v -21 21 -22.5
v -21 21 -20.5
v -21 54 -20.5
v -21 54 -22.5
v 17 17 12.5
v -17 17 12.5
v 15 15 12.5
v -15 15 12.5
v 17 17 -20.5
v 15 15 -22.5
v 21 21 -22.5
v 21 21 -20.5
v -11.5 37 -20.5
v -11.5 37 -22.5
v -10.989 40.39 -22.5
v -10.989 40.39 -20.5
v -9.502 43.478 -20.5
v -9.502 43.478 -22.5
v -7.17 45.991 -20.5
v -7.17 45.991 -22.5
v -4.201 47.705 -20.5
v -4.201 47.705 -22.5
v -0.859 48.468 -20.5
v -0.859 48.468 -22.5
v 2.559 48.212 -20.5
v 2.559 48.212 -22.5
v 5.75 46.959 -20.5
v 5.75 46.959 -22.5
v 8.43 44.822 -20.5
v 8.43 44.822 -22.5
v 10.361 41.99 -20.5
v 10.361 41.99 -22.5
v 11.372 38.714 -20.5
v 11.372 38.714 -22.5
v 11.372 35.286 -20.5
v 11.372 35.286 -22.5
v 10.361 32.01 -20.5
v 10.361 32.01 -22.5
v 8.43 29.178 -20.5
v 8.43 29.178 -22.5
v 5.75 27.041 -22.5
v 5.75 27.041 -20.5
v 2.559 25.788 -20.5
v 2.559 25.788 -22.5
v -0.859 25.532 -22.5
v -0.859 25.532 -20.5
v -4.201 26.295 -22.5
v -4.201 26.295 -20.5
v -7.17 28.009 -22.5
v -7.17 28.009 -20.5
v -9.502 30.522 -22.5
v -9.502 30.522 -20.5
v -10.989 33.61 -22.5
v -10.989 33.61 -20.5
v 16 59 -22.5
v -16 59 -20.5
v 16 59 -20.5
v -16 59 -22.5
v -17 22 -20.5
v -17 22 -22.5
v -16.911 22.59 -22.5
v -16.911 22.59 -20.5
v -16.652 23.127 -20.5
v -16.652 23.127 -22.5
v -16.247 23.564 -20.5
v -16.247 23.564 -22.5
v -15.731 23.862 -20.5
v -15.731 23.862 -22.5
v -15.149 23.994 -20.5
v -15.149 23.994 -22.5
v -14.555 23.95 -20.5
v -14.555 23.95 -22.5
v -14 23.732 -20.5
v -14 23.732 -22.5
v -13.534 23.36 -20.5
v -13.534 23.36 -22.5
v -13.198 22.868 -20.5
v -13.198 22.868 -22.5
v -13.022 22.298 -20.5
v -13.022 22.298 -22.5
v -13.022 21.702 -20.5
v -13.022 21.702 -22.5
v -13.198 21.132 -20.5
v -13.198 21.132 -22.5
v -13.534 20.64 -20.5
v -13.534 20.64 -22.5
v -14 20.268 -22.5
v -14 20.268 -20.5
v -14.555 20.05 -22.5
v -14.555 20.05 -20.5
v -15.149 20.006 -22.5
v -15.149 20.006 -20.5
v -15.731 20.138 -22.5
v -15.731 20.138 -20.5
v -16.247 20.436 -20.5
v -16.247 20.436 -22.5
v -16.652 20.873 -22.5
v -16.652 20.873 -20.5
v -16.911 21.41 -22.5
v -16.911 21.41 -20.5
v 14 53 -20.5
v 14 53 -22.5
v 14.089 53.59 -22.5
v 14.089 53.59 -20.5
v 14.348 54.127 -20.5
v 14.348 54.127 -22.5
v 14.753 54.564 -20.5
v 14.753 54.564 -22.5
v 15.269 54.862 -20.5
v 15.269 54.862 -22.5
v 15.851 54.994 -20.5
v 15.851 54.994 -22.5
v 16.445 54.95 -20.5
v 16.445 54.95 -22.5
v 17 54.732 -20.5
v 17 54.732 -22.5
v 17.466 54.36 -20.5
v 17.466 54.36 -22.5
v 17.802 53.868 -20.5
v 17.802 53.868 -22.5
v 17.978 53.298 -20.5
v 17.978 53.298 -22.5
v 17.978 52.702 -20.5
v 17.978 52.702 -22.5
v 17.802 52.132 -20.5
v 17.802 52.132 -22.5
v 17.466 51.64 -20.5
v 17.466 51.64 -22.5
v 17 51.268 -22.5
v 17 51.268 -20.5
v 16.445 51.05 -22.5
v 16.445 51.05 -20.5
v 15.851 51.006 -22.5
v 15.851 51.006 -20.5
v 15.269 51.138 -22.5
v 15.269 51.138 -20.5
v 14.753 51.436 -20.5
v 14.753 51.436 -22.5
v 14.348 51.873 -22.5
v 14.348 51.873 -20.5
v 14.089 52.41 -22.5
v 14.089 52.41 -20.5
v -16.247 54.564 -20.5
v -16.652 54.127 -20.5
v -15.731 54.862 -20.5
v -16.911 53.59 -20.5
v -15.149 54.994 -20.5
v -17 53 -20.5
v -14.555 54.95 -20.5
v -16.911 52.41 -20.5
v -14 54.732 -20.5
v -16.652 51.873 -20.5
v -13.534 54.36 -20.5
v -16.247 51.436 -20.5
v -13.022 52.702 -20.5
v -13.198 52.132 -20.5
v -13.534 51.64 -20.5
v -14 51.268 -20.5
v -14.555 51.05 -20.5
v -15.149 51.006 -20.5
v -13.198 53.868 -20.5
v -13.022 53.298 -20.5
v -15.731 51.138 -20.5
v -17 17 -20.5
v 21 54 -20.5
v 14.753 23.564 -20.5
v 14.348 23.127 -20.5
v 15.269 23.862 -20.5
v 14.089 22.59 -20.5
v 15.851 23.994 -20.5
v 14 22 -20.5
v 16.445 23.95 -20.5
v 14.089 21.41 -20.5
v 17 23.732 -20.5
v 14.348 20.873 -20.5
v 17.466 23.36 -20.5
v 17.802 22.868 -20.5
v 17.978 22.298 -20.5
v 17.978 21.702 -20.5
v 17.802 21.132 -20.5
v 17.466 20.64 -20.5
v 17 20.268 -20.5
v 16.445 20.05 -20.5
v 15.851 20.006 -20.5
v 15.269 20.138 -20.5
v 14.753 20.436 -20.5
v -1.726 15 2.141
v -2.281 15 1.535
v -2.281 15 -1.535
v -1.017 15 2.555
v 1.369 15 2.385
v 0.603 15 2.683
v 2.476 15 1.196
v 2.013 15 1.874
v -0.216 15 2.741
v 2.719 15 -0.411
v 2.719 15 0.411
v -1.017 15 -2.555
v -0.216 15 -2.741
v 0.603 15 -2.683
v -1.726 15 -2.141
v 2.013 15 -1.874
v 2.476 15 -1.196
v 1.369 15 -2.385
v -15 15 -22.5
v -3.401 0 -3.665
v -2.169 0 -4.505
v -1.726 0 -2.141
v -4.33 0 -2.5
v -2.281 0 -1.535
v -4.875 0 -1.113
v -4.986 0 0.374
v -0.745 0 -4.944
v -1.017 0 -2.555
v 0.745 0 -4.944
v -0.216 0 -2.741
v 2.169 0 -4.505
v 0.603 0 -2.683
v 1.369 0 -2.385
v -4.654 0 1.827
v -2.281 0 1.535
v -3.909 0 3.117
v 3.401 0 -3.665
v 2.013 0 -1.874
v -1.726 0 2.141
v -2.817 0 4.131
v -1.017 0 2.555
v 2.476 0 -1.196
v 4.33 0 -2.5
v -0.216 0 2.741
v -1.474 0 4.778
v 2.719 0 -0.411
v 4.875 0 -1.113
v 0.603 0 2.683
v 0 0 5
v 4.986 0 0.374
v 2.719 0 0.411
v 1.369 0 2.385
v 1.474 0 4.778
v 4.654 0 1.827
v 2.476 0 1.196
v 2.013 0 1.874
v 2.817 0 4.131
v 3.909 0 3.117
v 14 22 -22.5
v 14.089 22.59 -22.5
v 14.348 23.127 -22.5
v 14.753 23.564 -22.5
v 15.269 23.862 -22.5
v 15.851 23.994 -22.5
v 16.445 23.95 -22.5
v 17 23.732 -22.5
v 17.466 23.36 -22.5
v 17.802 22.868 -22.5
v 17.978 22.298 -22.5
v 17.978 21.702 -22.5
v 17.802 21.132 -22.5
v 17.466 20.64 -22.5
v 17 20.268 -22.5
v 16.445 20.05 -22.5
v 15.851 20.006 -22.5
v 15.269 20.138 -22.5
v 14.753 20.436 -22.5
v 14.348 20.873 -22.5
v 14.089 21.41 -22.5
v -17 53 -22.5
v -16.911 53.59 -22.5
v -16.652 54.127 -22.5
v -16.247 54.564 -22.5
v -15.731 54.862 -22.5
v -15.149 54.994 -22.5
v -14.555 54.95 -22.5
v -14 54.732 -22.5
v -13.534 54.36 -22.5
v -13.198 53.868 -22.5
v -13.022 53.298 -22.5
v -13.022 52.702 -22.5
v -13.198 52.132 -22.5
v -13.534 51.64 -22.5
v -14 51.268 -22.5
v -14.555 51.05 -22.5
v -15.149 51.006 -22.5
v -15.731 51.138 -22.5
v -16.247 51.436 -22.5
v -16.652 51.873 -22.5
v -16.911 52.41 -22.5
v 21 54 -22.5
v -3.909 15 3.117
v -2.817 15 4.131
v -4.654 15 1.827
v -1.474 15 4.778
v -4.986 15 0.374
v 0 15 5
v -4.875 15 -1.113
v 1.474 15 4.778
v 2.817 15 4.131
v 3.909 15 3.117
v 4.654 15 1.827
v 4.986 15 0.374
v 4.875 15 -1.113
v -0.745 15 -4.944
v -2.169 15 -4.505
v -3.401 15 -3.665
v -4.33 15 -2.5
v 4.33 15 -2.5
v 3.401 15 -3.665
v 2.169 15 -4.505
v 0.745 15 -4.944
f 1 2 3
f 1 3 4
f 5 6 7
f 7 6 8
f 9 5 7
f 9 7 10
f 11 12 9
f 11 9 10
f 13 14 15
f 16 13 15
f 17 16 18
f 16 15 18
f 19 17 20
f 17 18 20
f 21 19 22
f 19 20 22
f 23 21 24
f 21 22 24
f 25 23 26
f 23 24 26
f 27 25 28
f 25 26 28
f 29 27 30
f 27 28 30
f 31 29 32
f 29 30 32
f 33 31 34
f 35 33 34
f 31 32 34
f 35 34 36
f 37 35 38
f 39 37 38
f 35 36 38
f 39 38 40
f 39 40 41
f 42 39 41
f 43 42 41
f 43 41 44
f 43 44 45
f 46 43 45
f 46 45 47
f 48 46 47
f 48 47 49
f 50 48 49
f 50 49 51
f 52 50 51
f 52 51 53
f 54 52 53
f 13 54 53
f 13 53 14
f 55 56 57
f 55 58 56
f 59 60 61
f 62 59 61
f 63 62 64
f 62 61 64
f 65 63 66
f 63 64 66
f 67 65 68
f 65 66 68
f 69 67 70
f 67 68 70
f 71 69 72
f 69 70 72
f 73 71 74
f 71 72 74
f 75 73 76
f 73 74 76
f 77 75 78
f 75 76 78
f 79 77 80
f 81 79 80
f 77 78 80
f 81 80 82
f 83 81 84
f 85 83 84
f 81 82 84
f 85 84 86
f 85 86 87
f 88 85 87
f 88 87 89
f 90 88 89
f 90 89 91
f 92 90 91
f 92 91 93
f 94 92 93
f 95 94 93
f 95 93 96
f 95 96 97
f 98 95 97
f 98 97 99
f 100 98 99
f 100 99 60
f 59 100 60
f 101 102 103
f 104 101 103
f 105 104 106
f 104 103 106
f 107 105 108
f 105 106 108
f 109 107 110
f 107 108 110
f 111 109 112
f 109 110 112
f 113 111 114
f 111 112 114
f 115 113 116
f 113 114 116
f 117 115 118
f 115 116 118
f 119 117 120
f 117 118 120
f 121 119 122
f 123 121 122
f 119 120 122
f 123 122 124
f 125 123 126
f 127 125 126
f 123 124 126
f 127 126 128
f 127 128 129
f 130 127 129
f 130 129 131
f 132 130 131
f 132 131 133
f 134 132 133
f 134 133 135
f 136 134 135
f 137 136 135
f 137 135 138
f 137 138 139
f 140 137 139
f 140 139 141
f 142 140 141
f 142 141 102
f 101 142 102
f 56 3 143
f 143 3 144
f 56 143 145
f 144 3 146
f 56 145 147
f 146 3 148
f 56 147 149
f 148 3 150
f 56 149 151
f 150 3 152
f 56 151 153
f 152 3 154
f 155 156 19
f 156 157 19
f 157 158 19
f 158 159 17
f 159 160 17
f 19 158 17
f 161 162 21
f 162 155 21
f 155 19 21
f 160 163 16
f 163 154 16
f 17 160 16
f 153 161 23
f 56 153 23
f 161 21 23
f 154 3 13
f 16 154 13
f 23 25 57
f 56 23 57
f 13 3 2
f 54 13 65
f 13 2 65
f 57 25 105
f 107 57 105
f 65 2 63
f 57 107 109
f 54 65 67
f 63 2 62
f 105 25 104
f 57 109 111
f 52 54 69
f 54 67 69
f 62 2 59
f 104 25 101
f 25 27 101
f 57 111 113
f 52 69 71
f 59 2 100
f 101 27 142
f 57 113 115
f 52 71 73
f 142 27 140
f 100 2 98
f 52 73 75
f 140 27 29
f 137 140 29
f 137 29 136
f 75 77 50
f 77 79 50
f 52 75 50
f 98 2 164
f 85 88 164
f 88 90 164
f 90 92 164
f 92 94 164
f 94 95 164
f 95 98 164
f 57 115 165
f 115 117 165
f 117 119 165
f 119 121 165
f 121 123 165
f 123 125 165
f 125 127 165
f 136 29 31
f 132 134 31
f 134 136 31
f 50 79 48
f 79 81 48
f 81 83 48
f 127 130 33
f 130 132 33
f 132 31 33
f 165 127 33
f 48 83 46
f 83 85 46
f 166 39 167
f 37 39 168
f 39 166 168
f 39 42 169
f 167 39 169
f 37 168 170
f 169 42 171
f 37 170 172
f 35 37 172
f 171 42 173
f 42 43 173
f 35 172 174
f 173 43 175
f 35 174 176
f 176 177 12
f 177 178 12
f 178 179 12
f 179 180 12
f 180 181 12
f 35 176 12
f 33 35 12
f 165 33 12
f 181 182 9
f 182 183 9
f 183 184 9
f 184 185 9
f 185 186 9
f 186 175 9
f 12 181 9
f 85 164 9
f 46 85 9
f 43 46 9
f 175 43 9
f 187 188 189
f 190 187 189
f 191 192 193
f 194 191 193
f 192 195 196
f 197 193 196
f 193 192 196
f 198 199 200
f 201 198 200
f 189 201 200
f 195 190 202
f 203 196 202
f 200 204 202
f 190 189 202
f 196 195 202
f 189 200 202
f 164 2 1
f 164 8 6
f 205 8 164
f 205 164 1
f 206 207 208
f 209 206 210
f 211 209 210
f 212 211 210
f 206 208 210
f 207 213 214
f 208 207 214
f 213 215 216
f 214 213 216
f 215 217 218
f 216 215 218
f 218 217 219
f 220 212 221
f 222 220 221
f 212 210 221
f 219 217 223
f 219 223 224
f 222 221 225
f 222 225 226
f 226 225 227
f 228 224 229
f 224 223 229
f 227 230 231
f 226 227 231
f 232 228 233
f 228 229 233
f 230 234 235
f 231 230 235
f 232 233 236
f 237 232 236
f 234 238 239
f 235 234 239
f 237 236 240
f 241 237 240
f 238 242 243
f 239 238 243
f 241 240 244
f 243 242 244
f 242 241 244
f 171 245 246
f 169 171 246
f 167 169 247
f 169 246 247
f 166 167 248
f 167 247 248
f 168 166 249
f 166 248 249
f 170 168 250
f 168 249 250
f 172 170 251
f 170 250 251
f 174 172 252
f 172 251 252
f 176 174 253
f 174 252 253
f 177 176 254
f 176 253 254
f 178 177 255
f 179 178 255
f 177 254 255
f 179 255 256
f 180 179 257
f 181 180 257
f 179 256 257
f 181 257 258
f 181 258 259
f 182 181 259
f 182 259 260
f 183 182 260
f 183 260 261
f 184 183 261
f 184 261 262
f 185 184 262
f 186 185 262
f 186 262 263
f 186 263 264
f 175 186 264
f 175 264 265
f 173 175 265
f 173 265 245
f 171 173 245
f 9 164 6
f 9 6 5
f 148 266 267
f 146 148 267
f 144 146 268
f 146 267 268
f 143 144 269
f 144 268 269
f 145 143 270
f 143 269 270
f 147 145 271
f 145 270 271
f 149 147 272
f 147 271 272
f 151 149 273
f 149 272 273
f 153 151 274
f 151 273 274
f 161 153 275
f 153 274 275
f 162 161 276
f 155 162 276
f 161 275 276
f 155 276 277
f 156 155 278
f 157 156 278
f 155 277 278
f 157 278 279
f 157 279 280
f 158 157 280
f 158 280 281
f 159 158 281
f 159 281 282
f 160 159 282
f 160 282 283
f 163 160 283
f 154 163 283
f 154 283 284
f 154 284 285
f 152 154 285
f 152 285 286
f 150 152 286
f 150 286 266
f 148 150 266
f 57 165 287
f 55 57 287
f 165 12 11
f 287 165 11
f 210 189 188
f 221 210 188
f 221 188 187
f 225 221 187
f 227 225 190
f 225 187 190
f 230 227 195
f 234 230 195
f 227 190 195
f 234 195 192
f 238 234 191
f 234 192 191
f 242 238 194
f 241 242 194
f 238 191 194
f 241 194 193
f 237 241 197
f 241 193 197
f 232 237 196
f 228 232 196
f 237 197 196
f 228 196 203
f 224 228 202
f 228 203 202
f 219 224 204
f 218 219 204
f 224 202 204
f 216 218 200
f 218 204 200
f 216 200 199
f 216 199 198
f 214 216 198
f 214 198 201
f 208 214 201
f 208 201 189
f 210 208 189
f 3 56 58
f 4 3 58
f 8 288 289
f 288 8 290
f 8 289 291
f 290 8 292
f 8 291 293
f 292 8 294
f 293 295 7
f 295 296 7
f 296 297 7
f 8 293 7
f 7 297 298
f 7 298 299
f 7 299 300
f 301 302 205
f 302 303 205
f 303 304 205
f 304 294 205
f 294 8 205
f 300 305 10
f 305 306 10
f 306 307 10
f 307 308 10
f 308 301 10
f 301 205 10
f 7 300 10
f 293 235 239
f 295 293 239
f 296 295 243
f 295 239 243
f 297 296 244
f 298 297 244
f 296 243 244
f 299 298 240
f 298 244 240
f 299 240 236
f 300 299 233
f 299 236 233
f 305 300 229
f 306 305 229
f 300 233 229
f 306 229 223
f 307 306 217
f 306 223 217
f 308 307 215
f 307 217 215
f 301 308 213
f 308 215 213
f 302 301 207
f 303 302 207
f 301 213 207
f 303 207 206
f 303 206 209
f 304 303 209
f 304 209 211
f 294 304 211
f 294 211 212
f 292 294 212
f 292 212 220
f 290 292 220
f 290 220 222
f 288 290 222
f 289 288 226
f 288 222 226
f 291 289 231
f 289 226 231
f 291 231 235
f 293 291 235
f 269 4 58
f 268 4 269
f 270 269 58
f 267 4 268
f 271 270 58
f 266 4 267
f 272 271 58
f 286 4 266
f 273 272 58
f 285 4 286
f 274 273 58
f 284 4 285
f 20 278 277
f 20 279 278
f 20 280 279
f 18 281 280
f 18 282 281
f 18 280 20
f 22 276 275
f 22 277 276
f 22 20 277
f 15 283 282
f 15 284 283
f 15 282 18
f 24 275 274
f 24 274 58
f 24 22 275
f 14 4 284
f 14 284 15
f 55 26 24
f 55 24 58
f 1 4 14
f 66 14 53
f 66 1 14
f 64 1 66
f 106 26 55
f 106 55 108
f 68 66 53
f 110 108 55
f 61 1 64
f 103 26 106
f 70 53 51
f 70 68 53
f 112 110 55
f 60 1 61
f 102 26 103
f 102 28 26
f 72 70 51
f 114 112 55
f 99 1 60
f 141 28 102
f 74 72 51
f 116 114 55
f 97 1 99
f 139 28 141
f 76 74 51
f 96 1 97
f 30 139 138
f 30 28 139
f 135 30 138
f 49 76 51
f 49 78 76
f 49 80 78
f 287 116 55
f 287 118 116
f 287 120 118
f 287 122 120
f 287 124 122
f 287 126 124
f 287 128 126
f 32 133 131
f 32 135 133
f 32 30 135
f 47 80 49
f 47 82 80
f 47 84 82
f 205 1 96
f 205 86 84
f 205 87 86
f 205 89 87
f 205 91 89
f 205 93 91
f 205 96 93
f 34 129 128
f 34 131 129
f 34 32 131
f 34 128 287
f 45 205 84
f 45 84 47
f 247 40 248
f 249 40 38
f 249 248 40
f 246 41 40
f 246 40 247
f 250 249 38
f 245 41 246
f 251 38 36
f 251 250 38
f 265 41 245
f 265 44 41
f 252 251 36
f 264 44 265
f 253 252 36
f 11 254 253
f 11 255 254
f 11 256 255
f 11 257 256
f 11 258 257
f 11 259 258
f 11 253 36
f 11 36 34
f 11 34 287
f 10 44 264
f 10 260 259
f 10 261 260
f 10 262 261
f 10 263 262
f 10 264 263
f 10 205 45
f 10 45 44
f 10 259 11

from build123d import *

# Parameters (mm, degrees)
SKETCH1_R           = 5
BOSS_EXTRUDE1_DEPTH = 15
CUT_EXTRUDE1_DEPTH  = 17.583123952
SKETCH3_W           = 42
SKETCH3_H           = 45
BOSS_EXTRUDE2_DEPTH = 2
SKETCH4_W           = 42
SKETCH4_H           = 2
BOSS_EXTRUDE3_DEPTH = 42
SKETCH6_R           = 11.5
CUT_EXTRUDE3_DEPTH  = 10
SKETCH7_W           = 42
SKETCH7_H           = 10
CUT_EXTRUDE4_DEPTH  = 10
SKETCH5_R           = 2
CUT_EXTRUDE5_DEPTH  = 10
CHAMFER1_SIZE       = 5
CHAMFER2_SIZE       = 6


with BuildPart() as part:
    # Sketch1 → Boss-Extrude1 (new body)
    with BuildSketch(Plane(origin=(0, 0, 0), x_dir=(1, 0, 0), z_dir=(0, 1, 0))):
        with Locations(Location((0, 0, 0), (0, 0, 270))):
            Circle(SKETCH1_R)
    extrude(amount=BOSS_EXTRUDE1_DEPTH)

    # Sketch2 → Cut-Extrude1 (cut, through all)
    with BuildSketch(Plane(origin=(0, 15, 0), x_dir=(1, 0, 0), z_dir=(0, 1, 0))):
        with BuildLine():
            Line((-2.28148439, 1.53535956), (-2.28148439, -1.53535956))
            ThreePointArc((-2.28148439, -1.53535956), (2.75, 0), (-2.28148439, 1.53535956))
        make_face()
    extrude(amount=-CUT_EXTRUDE1_DEPTH, mode=Mode.SUBTRACT)

    # Sketch3 → Boss-Extrude2 (add)
    with BuildSketch(Plane(origin=(0, 15, 0), x_dir=(1, 0, 0), z_dir=(0, 1, 0))):
        Rectangle(SKETCH3_W, SKETCH3_H)
    extrude(amount=BOSS_EXTRUDE2_DEPTH)

    # Sketch4 → Boss-Extrude3 (add)
    with BuildSketch(Plane(origin=(0, 17, 0), x_dir=(1, 0, 0), z_dir=(0, 1, 0))):
        with Locations((0, 21.5)):
            Rectangle(SKETCH4_W, SKETCH4_H)
    extrude(amount=BOSS_EXTRUDE3_DEPTH)

    # Sketch6 → Cut-Extrude3 (cut)
    with BuildSketch(Plane(origin=(0, 0, -22.5), x_dir=(-1, 0, 0), z_dir=(0, 0, -1))):
        with Locations((0, 37)):
            Circle(SKETCH6_R)
    extrude(amount=-CUT_EXTRUDE3_DEPTH, mode=Mode.SUBTRACT)

    # Sketch7 → Cut-Extrude4 (cut)
    with BuildSketch(Plane(origin=(0, 17, 0), x_dir=(1, 0, 0), z_dir=(0, 1, 0))):
        with Locations((0, -17.5)):
            Rectangle(SKETCH7_W, SKETCH7_H)
    extrude(amount=-CUT_EXTRUDE4_DEPTH, mode=Mode.SUBTRACT)

    # Sketch5 → Cut-Extrude5 (cut)
    with BuildSketch(Plane(origin=(0, 0, -22.5), x_dir=(-1, 0, 0), z_dir=(0, 0, -1))):
        with Locations((15, 53)):
            Circle(SKETCH5_R)
        with Locations((-16, 53)):
            Circle(SKETCH5_R)
        with Locations((15, 22)):
            Circle(SKETCH5_R)
        with Locations((-16, 22)):
            Circle(SKETCH5_R)
    extrude(amount=-CUT_EXTRUDE5_DEPTH, mode=Mode.SUBTRACT)

    # Chamfer1
    chamfer1_edges = [part.edges().sort_by_distance(p)[0] for p in [
        (-21, 59, -21.5),
        (21, 59, -21.5),
    ]]
    chamfer(chamfer1_edges, length=CHAMFER1_SIZE)

    # Chamfer2
    chamfer2_edges = [part.edges().sort_by_distance(p)[0] for p in [
        (21, 15, -5),
        (-21, 15, -5),
    ]]
    chamfer(chamfer2_edges, length=CHAMFER2_SIZE)


solid = part.part
